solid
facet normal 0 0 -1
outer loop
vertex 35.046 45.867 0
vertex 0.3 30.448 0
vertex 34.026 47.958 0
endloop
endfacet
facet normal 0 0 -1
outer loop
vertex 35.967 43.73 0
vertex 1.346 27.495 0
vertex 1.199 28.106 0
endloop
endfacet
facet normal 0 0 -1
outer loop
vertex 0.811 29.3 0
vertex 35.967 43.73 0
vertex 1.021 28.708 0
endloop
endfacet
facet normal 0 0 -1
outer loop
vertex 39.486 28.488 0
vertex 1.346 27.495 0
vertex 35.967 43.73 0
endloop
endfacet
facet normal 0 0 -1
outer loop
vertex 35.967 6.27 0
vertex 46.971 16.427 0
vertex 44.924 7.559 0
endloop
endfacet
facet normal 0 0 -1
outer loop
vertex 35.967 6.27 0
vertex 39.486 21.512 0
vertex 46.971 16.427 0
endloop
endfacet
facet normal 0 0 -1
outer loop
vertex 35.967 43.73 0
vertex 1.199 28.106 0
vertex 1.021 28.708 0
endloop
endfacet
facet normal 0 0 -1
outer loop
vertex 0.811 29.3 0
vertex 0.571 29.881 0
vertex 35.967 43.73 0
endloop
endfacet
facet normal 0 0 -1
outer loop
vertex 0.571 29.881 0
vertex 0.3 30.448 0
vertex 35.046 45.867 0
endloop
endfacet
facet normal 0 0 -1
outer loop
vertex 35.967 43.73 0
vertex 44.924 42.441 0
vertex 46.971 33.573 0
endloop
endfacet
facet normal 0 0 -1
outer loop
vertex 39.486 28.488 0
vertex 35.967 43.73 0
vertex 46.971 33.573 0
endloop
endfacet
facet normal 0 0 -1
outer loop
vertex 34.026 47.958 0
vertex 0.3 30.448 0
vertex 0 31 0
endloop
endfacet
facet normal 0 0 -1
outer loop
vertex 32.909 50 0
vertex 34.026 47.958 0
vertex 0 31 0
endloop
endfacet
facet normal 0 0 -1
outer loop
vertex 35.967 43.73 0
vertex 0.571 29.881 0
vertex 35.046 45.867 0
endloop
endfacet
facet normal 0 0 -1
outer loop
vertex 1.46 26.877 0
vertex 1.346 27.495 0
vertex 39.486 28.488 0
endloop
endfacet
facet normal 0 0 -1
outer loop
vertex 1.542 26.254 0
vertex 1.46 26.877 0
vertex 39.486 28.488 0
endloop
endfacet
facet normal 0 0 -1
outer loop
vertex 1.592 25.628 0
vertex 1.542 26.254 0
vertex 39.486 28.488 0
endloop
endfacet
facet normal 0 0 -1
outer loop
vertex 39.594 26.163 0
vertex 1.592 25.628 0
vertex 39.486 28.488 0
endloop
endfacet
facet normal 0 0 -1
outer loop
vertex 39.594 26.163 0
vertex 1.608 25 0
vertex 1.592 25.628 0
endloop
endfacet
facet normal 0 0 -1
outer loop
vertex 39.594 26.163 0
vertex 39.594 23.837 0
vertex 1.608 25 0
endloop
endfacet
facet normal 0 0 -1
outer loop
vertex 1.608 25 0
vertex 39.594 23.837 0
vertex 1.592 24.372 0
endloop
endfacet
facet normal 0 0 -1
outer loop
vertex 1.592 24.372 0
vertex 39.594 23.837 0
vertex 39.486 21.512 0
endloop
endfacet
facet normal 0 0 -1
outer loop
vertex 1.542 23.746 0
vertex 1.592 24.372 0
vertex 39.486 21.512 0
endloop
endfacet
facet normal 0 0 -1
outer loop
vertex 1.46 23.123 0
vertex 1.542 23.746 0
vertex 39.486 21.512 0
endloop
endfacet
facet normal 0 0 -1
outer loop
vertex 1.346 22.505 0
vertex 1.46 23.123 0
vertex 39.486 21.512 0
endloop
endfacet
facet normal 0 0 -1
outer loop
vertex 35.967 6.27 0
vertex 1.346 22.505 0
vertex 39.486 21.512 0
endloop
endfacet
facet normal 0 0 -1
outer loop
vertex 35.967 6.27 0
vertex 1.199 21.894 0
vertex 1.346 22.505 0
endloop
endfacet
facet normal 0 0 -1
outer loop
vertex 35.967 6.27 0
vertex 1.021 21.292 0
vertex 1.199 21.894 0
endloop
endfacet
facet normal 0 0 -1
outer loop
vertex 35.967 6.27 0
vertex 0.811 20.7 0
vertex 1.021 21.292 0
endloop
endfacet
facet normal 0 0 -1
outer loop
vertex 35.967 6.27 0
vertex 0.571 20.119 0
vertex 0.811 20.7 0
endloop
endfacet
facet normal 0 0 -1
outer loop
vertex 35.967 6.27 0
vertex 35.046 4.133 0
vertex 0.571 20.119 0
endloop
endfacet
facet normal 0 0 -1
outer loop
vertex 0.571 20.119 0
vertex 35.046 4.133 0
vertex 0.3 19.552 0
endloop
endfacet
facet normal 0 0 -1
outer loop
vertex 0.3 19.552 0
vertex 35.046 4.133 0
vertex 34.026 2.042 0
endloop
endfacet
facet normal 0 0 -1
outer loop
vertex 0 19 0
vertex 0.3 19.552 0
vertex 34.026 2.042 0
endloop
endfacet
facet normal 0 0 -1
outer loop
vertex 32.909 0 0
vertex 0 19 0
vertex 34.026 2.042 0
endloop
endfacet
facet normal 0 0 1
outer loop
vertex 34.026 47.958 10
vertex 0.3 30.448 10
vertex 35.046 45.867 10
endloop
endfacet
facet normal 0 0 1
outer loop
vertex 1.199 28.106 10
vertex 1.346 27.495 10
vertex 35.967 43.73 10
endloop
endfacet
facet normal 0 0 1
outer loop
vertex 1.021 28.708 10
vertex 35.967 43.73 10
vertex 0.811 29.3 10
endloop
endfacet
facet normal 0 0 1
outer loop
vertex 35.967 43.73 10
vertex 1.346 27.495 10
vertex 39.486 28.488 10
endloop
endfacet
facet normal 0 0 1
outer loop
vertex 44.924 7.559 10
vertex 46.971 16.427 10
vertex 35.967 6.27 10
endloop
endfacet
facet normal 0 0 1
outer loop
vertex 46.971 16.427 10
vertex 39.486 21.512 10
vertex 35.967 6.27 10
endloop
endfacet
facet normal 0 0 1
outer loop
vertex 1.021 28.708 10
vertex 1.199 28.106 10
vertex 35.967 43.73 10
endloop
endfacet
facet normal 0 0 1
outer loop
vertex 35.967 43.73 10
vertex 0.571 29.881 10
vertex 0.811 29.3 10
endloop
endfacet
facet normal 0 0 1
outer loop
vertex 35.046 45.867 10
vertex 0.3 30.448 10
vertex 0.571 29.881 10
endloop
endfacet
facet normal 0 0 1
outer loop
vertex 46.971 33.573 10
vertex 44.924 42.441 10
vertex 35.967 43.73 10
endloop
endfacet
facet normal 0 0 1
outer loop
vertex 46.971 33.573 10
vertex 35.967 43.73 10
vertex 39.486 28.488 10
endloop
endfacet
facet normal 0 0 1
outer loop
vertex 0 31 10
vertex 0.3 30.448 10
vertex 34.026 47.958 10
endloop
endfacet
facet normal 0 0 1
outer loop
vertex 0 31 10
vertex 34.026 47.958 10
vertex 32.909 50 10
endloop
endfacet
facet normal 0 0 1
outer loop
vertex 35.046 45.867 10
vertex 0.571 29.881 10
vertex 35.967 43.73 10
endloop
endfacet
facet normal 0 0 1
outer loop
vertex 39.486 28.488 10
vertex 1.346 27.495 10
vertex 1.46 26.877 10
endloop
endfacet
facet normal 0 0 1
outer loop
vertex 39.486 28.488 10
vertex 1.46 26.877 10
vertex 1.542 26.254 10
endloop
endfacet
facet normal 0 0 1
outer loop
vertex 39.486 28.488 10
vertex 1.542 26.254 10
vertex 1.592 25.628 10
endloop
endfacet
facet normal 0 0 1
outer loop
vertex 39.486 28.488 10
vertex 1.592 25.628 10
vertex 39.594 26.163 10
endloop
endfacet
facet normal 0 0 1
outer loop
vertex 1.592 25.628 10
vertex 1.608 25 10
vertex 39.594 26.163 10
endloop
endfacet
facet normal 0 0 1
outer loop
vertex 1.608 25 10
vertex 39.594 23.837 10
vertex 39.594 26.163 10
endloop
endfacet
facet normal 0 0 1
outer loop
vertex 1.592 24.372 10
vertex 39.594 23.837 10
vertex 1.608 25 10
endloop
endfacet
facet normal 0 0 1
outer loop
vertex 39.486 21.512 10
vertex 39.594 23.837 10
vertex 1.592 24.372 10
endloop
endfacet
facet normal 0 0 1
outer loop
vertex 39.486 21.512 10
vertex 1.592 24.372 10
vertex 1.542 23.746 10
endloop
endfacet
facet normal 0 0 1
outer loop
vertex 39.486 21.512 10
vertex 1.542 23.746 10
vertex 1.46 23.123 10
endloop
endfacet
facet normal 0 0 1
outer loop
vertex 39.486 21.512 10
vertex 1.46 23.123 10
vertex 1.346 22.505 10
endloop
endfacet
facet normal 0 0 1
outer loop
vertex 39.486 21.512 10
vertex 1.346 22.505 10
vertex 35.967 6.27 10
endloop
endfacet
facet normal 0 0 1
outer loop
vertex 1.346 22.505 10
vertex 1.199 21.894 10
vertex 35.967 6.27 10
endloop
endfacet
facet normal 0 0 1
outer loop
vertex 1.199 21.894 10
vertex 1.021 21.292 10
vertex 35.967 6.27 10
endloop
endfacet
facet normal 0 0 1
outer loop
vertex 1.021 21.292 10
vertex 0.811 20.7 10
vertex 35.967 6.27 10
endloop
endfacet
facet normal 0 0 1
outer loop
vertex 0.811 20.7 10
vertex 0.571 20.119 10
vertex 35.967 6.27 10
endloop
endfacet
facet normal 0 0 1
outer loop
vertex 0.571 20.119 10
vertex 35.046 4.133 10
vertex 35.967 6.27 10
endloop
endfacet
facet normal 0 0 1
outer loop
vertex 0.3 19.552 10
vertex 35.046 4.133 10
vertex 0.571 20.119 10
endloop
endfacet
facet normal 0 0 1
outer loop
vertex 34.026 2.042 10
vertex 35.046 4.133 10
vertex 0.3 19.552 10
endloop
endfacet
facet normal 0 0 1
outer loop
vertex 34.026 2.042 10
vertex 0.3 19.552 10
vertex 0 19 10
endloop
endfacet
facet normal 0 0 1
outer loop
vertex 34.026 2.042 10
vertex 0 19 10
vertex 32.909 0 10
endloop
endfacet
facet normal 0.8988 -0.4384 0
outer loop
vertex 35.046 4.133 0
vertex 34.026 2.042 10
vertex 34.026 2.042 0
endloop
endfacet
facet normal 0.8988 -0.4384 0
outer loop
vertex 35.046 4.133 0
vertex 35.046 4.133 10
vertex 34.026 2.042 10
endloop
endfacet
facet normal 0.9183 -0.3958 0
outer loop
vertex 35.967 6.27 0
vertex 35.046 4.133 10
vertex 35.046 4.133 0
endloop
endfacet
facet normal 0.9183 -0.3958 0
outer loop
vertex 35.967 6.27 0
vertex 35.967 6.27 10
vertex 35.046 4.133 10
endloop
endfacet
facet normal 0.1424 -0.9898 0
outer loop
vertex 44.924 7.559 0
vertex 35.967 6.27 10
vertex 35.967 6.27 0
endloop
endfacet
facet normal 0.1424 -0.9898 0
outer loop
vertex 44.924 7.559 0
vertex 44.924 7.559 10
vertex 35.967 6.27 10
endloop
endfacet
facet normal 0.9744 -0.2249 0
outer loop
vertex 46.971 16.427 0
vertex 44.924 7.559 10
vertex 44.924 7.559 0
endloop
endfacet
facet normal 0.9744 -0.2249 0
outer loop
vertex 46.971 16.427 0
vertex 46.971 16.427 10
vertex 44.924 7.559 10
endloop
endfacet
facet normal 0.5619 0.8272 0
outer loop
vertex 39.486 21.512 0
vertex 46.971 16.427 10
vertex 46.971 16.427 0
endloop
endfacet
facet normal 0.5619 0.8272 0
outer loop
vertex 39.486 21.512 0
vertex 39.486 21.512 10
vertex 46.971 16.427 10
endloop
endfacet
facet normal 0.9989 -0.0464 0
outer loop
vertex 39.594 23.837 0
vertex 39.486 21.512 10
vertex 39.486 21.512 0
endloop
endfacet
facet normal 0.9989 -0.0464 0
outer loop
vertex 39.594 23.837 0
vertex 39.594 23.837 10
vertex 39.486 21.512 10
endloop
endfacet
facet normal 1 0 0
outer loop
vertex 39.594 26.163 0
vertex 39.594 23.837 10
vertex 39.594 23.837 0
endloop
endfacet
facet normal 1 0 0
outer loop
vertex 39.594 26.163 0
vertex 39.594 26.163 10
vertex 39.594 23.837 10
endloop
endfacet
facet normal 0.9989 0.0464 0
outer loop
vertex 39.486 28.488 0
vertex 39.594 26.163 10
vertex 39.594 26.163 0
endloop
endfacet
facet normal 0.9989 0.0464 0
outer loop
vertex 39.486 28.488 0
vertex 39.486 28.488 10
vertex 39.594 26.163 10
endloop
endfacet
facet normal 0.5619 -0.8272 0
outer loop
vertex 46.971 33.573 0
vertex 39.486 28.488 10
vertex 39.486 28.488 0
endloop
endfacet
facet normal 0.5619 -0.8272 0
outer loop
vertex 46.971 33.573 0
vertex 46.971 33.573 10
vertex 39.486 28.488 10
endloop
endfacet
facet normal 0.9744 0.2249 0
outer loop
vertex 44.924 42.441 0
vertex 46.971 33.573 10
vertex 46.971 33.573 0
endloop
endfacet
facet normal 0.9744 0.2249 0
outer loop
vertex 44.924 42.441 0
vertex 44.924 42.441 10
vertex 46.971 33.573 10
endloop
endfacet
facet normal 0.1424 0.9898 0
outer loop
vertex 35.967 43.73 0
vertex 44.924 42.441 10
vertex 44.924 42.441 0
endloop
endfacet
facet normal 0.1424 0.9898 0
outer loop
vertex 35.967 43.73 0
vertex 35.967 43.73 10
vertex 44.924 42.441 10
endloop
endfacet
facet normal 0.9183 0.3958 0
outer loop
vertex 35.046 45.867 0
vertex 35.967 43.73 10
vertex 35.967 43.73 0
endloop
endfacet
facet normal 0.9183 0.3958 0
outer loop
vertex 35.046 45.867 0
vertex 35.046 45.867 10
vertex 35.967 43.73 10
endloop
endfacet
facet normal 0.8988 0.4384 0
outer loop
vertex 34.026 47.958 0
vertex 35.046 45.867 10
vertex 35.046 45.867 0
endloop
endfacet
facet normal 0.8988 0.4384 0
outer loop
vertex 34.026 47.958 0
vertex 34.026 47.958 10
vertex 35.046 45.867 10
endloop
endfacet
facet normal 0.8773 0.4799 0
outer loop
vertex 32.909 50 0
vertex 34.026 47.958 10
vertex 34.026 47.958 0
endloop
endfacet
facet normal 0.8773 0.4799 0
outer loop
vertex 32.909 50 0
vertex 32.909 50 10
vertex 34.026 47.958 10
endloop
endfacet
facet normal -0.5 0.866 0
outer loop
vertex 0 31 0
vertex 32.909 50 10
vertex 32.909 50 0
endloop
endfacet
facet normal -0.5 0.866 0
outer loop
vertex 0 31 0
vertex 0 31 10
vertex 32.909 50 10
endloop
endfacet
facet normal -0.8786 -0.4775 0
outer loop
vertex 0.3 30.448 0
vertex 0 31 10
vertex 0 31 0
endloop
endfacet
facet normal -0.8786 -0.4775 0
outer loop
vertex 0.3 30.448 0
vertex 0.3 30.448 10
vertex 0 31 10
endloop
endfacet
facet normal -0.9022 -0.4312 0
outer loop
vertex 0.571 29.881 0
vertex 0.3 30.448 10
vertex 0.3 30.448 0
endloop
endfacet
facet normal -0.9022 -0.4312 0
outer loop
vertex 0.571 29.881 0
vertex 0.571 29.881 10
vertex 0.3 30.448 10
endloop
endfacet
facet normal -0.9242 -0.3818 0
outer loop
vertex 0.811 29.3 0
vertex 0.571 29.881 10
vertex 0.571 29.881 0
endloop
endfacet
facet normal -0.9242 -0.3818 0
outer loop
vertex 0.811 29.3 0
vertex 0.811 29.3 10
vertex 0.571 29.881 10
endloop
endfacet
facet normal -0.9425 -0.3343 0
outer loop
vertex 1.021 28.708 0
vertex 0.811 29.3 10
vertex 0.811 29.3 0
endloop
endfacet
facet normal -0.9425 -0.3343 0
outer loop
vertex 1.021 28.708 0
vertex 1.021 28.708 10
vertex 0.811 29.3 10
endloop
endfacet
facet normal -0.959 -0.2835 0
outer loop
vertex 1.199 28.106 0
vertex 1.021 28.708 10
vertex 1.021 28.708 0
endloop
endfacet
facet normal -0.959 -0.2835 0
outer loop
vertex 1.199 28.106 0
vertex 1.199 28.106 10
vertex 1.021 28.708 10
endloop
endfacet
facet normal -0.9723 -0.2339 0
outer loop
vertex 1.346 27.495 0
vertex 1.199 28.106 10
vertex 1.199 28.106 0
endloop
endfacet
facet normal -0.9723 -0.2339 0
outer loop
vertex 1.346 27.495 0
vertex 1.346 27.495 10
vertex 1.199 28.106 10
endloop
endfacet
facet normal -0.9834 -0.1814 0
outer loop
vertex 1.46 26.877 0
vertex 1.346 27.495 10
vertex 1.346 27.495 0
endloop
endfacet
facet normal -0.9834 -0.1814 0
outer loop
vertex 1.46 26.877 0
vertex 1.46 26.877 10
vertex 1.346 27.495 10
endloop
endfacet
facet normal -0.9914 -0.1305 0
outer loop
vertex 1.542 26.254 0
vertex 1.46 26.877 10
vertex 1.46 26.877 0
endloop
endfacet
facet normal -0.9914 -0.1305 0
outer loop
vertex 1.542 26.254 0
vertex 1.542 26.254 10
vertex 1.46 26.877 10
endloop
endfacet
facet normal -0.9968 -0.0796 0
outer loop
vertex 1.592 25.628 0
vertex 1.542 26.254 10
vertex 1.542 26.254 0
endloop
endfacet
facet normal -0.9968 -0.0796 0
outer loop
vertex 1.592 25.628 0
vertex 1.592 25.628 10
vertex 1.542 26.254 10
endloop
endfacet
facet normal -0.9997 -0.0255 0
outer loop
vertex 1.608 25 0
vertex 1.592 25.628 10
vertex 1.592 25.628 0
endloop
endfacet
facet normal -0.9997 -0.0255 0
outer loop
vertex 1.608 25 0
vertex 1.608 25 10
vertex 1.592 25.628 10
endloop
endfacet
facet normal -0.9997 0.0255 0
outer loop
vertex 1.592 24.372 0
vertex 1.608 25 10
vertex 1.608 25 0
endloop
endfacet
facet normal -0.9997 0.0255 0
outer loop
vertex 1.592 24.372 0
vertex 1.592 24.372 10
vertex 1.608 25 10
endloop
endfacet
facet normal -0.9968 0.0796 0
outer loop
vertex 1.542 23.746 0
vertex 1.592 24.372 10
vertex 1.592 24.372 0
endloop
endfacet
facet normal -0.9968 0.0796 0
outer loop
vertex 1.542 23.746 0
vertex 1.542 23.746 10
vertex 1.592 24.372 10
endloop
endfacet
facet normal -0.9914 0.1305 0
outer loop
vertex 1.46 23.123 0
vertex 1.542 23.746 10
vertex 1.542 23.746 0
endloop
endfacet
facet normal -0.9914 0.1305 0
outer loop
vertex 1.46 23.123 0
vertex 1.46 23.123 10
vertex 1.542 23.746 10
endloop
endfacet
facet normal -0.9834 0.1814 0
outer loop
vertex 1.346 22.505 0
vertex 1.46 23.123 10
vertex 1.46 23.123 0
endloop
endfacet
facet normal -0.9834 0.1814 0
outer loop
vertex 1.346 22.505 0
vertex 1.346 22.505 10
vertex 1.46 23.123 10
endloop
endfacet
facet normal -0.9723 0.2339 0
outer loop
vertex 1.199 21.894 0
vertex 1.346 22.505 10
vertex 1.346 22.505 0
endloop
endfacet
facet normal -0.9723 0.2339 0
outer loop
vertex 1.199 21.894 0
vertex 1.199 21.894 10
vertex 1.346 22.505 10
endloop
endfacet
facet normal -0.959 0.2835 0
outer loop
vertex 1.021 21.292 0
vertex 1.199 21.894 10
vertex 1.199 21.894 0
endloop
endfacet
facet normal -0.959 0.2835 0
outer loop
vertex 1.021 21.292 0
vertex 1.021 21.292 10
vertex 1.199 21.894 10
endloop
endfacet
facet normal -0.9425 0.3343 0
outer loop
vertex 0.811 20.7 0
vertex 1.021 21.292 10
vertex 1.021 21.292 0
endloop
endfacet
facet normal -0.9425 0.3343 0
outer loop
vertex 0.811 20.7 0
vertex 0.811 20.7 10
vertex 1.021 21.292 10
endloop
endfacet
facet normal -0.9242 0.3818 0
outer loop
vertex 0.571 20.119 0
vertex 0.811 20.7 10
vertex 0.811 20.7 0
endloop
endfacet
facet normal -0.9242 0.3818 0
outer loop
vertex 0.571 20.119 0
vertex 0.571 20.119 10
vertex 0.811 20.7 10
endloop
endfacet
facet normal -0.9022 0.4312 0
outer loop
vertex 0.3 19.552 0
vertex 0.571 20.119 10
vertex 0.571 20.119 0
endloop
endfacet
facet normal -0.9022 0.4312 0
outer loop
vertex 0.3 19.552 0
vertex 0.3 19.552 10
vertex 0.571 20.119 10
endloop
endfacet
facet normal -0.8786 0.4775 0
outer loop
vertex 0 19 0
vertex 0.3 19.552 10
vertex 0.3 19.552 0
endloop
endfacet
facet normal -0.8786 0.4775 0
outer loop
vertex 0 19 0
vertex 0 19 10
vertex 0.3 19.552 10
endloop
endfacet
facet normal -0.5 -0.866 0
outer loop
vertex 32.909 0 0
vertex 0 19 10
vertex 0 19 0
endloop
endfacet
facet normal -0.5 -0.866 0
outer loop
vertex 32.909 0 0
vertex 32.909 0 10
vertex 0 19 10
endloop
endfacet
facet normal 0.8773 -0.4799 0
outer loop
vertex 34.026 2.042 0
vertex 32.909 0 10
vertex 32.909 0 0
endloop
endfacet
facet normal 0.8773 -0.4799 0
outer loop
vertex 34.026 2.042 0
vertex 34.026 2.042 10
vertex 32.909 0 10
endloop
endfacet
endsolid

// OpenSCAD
$fn = 32;

// ----------------------------------------------------------------------
// Gear sector: 2 teeth on 60 degrees
// ----------------------------------------------------------------------

// --- parameters (mm) ---
sector_angle = 60;        // sector angle, degrees
root_r = 50;              // root circle radius
tooth_h = 8;              // tooth height over the root circle
teeth = 2;                // number of teeth on the sector
hub_r = 12;               // hub bore radius
plate_t = 10;             // sector thickness, Z
arc_step = 3;             // sampling step of the root/hub arcs, degrees

tip_r = root_r + tooth_h;  // tip circle radius

profile = [[32.909, 0], [34.026, 2.042], [35.046, 4.133], [35.967, 6.27], [44.924, 7.559], [46.971, 16.427], [39.486, 21.512], [39.594, 23.837], [39.594, 26.163], [39.486, 28.488], [46.971, 33.573], [44.924, 42.441], [35.967, 43.73], [35.046, 45.867], [34.026, 47.958], [32.909, 50], [0, 31], [0.3, 30.448], [0.571, 29.881], [0.811, 29.3], [1.021, 28.708], [1.199, 28.106], [1.346, 27.495], [1.46, 26.877], [1.542, 26.254], [1.592, 25.628], [1.608, 25], [1.592, 24.372], [1.542, 23.746], [1.46, 23.123], [1.346, 22.505], [1.199, 21.894], [1.021, 21.292], [0.811, 20.7], [0.571, 20.119], [0.3, 19.552], [0, 19]];  // primary outline, 37 points, counter clockwise

// --- the one profile operation ---
linear_extrude(height = plate_t) polygon(points = profile);
